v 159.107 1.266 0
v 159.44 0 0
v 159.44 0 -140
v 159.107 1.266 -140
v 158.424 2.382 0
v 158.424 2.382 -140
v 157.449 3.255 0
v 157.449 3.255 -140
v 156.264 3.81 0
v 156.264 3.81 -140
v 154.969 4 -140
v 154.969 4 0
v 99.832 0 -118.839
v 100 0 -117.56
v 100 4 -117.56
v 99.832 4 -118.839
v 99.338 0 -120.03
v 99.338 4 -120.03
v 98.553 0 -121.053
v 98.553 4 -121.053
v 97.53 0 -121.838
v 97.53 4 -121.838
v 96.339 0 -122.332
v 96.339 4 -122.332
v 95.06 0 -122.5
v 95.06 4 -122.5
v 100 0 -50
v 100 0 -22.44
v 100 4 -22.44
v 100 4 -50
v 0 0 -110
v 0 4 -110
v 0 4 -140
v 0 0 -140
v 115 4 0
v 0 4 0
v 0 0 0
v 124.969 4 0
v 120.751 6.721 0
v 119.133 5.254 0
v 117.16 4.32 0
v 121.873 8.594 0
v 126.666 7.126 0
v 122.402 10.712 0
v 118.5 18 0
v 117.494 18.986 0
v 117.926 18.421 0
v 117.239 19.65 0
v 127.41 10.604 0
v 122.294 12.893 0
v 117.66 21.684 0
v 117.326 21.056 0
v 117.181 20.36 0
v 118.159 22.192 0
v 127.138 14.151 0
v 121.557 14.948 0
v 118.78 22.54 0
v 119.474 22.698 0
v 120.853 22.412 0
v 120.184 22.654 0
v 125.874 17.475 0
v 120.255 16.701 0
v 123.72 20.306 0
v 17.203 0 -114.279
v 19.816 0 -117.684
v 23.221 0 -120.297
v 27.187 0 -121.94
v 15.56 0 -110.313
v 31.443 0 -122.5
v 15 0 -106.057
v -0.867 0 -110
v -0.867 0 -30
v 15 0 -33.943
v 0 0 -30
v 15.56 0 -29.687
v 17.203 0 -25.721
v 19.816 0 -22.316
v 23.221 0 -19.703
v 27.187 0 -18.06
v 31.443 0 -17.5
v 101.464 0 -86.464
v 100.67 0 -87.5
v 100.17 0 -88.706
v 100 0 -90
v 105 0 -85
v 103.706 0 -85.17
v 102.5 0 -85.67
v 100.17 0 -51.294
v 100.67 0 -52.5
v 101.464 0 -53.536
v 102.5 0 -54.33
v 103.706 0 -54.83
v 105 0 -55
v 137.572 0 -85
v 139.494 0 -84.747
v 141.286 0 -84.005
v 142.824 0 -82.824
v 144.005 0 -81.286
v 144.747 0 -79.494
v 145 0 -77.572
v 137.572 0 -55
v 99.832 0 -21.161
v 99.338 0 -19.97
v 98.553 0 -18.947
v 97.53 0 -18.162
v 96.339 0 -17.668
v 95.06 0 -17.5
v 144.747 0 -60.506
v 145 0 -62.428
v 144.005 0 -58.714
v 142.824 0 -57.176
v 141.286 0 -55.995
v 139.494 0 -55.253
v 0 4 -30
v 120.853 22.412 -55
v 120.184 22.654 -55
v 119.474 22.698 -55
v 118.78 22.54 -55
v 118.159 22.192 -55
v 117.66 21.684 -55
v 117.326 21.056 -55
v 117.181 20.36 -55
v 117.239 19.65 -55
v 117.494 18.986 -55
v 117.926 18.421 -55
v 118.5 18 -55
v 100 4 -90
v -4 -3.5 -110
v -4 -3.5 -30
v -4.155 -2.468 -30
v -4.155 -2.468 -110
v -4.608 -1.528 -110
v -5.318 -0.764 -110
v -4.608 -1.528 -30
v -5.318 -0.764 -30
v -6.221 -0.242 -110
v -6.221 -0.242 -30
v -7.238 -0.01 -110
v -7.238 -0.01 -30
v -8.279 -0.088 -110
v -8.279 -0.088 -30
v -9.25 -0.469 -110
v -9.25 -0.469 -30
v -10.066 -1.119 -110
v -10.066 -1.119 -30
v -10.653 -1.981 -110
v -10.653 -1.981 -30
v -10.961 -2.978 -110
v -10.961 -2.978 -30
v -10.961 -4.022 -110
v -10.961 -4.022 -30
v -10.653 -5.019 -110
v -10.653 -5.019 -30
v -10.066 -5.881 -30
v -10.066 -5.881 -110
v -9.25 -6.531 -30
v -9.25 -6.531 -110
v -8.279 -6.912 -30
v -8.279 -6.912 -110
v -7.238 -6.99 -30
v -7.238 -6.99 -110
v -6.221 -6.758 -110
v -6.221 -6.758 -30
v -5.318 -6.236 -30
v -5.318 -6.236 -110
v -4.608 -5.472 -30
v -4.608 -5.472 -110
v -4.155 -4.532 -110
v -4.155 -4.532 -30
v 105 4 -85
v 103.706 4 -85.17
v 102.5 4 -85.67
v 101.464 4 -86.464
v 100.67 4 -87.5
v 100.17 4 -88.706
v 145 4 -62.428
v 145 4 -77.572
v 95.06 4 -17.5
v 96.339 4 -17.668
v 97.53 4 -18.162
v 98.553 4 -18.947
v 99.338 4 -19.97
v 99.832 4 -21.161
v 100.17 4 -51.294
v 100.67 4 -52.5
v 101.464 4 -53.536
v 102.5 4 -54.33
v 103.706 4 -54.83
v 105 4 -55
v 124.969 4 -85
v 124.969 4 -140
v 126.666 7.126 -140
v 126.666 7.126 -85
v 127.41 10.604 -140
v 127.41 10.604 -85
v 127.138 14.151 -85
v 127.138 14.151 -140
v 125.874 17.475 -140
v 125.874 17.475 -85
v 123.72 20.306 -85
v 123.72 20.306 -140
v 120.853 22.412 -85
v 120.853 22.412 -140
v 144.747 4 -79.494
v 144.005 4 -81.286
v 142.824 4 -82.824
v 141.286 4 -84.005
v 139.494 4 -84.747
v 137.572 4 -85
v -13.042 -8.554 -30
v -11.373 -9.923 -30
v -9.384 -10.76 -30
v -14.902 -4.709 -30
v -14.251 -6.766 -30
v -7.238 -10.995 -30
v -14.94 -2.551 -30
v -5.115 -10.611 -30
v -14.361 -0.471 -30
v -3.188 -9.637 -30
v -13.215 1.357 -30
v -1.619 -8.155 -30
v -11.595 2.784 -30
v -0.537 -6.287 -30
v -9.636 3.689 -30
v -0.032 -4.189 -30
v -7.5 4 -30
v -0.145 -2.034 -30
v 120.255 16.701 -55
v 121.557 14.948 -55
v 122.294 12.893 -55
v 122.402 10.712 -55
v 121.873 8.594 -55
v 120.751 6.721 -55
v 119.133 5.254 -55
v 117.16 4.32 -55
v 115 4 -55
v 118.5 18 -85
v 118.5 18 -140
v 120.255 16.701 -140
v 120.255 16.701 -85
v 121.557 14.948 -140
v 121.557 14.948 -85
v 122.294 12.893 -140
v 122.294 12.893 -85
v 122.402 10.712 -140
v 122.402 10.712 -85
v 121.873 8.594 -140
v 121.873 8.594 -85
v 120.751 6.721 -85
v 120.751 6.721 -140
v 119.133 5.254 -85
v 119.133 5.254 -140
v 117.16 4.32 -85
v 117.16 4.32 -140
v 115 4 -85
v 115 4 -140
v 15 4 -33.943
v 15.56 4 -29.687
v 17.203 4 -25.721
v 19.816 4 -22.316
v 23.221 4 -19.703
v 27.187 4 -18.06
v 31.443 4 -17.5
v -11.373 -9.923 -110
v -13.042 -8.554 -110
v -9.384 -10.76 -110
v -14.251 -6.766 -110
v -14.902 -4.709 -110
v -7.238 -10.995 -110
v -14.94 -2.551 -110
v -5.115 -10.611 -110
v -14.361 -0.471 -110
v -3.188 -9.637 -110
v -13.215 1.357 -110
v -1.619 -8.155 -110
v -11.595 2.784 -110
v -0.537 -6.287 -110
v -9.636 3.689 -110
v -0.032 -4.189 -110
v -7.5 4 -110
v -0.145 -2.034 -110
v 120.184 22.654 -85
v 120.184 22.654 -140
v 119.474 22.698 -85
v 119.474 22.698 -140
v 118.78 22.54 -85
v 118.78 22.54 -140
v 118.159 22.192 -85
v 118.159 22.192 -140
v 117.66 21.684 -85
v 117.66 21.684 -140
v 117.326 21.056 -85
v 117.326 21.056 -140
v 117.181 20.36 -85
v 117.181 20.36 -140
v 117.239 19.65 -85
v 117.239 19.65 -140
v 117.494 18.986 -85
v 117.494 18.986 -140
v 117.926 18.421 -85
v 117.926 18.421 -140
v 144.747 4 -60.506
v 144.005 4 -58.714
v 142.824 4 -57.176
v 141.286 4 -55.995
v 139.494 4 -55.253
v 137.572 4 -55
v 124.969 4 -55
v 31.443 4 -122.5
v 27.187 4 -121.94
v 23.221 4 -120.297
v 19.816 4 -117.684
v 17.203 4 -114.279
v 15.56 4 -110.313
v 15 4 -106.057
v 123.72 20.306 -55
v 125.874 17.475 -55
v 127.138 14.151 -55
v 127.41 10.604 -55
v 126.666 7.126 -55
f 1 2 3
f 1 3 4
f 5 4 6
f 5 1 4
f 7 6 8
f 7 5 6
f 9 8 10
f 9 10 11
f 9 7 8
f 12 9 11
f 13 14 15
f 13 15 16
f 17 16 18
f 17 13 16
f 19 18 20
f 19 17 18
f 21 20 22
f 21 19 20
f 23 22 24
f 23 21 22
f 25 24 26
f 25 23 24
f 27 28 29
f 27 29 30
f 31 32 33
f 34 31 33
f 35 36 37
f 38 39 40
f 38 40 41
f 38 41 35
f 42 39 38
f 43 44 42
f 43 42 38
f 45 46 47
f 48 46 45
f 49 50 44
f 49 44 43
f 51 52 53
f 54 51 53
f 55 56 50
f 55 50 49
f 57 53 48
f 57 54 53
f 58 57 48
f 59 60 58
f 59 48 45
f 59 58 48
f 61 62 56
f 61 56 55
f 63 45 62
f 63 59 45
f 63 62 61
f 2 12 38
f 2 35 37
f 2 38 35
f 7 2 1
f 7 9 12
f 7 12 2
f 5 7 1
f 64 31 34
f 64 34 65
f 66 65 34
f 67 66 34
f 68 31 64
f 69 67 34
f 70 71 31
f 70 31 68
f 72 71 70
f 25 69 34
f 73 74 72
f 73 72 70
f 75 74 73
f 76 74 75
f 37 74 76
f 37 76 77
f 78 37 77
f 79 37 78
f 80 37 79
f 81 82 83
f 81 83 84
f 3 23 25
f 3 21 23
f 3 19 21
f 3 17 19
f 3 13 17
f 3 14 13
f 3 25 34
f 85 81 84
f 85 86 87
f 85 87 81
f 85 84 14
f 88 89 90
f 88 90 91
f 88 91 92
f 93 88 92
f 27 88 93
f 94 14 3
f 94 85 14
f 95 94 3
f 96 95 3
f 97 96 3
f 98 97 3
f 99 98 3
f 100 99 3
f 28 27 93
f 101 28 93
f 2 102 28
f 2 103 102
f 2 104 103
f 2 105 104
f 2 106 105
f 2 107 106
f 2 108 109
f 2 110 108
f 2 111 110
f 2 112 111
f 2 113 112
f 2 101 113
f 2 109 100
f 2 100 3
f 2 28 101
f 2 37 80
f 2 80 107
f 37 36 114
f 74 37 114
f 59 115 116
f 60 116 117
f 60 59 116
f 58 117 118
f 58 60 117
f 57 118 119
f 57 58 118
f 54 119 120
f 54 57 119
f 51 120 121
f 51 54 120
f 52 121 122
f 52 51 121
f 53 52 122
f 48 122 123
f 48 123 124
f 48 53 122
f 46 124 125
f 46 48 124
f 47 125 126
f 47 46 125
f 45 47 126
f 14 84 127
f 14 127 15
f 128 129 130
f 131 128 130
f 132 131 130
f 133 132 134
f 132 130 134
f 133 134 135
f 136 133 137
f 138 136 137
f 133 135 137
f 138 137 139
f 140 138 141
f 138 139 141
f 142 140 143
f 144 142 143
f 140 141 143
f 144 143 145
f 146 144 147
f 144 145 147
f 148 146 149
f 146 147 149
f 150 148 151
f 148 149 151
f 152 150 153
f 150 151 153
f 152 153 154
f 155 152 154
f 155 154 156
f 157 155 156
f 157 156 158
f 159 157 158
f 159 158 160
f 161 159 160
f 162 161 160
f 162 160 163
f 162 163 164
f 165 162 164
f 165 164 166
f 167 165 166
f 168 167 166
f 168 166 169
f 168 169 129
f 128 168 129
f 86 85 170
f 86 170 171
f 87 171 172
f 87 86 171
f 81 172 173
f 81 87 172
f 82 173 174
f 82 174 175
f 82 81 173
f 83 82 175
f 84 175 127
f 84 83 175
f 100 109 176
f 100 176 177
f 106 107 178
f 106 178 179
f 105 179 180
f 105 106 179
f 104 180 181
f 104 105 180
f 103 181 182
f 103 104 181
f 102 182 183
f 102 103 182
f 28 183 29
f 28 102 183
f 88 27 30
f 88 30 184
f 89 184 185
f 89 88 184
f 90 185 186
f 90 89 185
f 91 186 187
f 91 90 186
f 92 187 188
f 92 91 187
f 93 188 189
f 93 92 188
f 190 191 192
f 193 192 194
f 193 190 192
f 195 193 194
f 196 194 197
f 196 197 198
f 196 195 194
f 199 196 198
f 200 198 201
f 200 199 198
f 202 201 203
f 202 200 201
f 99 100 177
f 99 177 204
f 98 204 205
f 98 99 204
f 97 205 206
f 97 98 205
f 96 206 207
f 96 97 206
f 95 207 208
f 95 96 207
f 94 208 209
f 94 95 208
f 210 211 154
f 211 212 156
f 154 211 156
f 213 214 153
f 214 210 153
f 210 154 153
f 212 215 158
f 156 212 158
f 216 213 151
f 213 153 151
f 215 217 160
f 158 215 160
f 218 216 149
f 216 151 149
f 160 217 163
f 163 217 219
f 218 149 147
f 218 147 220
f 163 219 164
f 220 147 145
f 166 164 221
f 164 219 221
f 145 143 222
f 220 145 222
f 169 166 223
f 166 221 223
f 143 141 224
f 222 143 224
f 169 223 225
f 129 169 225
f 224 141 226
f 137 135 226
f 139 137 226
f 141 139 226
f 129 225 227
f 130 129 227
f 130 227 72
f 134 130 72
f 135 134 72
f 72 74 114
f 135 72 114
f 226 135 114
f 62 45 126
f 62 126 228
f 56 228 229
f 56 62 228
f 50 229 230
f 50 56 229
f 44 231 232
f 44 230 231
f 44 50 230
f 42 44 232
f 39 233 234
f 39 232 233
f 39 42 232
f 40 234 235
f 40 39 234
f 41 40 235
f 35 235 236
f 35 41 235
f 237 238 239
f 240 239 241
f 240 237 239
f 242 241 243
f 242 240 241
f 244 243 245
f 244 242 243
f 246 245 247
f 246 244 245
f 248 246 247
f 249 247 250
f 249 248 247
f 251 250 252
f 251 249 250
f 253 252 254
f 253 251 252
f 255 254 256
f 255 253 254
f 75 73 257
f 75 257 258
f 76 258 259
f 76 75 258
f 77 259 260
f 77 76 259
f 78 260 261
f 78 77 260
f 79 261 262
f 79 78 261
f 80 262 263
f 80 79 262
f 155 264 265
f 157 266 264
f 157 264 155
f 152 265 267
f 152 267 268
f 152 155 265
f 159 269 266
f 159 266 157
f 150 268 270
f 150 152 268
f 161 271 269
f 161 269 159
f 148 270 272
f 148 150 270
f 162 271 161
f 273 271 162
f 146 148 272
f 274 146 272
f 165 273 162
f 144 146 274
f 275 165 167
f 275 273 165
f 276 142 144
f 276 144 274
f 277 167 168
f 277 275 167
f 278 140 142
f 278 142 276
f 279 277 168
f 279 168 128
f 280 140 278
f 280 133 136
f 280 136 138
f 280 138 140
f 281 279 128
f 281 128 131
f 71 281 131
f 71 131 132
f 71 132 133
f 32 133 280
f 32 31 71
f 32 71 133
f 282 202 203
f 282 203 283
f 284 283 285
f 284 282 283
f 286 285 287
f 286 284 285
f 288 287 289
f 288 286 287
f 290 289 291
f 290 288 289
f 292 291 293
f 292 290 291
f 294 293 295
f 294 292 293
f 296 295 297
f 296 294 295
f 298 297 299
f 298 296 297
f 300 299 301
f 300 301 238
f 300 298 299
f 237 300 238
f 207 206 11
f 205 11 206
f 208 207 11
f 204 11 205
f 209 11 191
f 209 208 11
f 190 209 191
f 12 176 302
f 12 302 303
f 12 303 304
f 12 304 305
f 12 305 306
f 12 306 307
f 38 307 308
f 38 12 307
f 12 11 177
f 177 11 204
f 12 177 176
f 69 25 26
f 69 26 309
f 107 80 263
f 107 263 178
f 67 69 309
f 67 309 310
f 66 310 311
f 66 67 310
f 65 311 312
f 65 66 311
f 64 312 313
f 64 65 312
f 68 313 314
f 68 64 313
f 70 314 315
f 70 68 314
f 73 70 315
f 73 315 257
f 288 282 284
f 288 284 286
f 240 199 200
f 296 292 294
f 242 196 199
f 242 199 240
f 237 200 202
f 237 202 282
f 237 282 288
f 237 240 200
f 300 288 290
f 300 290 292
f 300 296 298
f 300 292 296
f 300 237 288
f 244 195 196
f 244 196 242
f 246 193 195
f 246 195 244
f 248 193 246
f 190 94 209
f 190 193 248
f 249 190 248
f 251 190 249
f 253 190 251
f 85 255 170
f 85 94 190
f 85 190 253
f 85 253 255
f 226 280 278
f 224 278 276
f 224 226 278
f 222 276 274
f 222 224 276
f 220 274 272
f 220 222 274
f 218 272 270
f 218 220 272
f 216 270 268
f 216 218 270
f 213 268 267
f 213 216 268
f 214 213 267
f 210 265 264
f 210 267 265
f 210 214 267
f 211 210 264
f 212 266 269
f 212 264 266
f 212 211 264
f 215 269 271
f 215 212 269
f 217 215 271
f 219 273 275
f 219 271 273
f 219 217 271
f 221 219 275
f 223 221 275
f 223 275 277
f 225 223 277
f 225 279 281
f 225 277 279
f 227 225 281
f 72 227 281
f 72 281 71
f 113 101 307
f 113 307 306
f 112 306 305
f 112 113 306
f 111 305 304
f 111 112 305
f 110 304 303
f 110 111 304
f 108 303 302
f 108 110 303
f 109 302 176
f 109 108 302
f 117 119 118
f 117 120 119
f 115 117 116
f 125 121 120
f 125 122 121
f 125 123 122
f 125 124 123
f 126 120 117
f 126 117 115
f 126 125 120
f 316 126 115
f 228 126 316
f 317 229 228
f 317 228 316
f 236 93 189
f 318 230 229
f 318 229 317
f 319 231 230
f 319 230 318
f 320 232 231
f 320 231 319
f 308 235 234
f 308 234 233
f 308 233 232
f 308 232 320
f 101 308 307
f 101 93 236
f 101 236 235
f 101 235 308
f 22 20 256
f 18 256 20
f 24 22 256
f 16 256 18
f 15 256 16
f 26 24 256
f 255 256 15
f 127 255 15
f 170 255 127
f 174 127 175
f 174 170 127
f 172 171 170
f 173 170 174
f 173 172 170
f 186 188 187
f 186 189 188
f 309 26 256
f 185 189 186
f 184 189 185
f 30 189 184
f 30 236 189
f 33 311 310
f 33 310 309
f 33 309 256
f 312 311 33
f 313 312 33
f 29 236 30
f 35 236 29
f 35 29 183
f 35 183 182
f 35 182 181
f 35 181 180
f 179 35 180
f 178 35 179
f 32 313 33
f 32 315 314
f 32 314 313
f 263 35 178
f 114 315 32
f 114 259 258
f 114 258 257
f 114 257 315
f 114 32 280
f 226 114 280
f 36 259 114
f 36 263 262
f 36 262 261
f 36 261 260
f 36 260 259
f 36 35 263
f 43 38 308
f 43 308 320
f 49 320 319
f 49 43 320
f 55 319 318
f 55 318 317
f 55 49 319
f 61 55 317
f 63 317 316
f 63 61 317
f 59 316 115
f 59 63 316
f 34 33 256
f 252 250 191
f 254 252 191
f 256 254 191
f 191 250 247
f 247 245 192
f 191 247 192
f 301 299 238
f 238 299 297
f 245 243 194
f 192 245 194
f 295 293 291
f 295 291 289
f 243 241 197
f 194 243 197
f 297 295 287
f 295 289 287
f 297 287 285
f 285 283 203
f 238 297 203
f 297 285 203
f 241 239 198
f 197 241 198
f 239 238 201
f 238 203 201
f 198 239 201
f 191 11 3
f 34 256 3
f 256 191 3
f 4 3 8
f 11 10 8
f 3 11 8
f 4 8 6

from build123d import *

# Parameters (mm, degrees)
SKETCH_1_R               = 3.5
EXTRUDE_1_DEPTH          = 140
SKETCH_2_W               = 30
SKETCH_2_H               = 27.344925094
CUT_EXTRUDE_1_DEPTH      = 214.393529953
CUT_EXTRUDE_3_DEPTH      = 214.005050566
CUT_EXTRUDE_3_DEPTH_BACK = 214.005050566


with BuildPart() as part:
    # 草图1 → 凸台-拉伸1 (new body)
    with BuildSketch(Plane.XY):
        with BuildLine():
            Line((154.968701019, 4), (124.968701019, 4))
            ThreePointArc((124.968701019, 4), (127.137930645, 14.150809034), (120.852941176, 22.411764706))
            ThreePointArc((120.852941176, 22.411764706), (117.470588235, 21.382352941), (118.5, 18))
            ThreePointArc((118.5, 18), (122.215434845, 9.633641289), (115, 4))
            Line((115, 4), (0, 4))
            Line((0, 4), (-7.5, 4))
            ThreePointArc((-7.5, 4), (-11.372983346, -9.922616289), (-0.866750419, 0))
            Line((-0.866750419, 0), (0, 0))
            Line((0, 0), (115, 0))
            Line((115, 0), (159.440401192, 0))
            ThreePointArc((159.440401192, 0), (157.968538616, 2.854080771), (154.968701019, 4))
        make_face()
        with Locations((-7.5, -3.5)):
            Circle(SKETCH_1_R, mode=Mode.SUBTRACT)
    extrude(amount=-EXTRUDE_1_DEPTH)

    # 草图2 → 切除-拉伸1 (cut, through all)
    with BuildSketch(Plane(origin=(0, 0, 0), x_dir=(0, 0, -1), z_dir=(1, 0, 0))):
        with Locations((15, -2.172462547)):
            Rectangle(SKETCH_2_W, SKETCH_2_H)
        with Locations((125, -2.172462547)):
            Rectangle(SKETCH_2_W, SKETCH_2_H)
    extrude(amount=-CUT_EXTRUDE_1_DEPTH, mode=Mode.SUBTRACT)

    # 草图3 → 切除-拉伸3 (cut, two sides: drawn at the far end of the back side and taken through both)
    with BuildSketch(Plane(origin=(0, 4, 0), x_dir=(1, 0, 0), z_dir=(0, 1, 0)).offset(-CUT_EXTRUDE_3_DEPTH_BACK)):
        with BuildLine():
            Line((15, 106.057196128), (15, 33.942803872))
            ThreePointArc((15, 33.942803872), (19.815985752, 22.315985752), (31.442803872, 17.5))
            Line((31.442803872, 17.5), (95.059923468, 17.5))
            ThreePointArc((95.059923468, 17.5), (98.553085083, 18.946914917), (100, 22.440076532))
            Line((100, 22.440076532), (100, 50))
            ThreePointArc((100, 50), (101.464466094, 53.535533906), (105, 55))
            Line((105, 55), (115, 55))
            Line((115, 55), (137.57175482, 55))
            ThreePointArc((137.57175482, 55), (142.824317359, 57.175682641), (145, 62.42824518))
            Line((145, 62.42824518), (145, 77.57175482))
            ThreePointArc((145, 77.57175482), (142.824317359, 82.824317359), (137.57175482, 85))
            Line((137.57175482, 85), (115, 85))
            Line((115, 85), (105, 85))
            ThreePointArc((105, 85), (101.464466094, 86.464466094), (100, 90))
            Line((100, 90), (100, 117.559923468))
            ThreePointArc((100, 117.559923468), (98.553085083, 121.053085083), (95.059923468, 122.5))
            Line((95.059923468, 122.5), (31.442803872, 122.5))
            ThreePointArc((31.442803872, 122.5), (19.815985752, 117.684014248), (15, 106.057196128))
        make_face()
    extrude(amount=CUT_EXTRUDE_3_DEPTH + CUT_EXTRUDE_3_DEPTH_BACK, mode=Mode.SUBTRACT)


solid = part.part
